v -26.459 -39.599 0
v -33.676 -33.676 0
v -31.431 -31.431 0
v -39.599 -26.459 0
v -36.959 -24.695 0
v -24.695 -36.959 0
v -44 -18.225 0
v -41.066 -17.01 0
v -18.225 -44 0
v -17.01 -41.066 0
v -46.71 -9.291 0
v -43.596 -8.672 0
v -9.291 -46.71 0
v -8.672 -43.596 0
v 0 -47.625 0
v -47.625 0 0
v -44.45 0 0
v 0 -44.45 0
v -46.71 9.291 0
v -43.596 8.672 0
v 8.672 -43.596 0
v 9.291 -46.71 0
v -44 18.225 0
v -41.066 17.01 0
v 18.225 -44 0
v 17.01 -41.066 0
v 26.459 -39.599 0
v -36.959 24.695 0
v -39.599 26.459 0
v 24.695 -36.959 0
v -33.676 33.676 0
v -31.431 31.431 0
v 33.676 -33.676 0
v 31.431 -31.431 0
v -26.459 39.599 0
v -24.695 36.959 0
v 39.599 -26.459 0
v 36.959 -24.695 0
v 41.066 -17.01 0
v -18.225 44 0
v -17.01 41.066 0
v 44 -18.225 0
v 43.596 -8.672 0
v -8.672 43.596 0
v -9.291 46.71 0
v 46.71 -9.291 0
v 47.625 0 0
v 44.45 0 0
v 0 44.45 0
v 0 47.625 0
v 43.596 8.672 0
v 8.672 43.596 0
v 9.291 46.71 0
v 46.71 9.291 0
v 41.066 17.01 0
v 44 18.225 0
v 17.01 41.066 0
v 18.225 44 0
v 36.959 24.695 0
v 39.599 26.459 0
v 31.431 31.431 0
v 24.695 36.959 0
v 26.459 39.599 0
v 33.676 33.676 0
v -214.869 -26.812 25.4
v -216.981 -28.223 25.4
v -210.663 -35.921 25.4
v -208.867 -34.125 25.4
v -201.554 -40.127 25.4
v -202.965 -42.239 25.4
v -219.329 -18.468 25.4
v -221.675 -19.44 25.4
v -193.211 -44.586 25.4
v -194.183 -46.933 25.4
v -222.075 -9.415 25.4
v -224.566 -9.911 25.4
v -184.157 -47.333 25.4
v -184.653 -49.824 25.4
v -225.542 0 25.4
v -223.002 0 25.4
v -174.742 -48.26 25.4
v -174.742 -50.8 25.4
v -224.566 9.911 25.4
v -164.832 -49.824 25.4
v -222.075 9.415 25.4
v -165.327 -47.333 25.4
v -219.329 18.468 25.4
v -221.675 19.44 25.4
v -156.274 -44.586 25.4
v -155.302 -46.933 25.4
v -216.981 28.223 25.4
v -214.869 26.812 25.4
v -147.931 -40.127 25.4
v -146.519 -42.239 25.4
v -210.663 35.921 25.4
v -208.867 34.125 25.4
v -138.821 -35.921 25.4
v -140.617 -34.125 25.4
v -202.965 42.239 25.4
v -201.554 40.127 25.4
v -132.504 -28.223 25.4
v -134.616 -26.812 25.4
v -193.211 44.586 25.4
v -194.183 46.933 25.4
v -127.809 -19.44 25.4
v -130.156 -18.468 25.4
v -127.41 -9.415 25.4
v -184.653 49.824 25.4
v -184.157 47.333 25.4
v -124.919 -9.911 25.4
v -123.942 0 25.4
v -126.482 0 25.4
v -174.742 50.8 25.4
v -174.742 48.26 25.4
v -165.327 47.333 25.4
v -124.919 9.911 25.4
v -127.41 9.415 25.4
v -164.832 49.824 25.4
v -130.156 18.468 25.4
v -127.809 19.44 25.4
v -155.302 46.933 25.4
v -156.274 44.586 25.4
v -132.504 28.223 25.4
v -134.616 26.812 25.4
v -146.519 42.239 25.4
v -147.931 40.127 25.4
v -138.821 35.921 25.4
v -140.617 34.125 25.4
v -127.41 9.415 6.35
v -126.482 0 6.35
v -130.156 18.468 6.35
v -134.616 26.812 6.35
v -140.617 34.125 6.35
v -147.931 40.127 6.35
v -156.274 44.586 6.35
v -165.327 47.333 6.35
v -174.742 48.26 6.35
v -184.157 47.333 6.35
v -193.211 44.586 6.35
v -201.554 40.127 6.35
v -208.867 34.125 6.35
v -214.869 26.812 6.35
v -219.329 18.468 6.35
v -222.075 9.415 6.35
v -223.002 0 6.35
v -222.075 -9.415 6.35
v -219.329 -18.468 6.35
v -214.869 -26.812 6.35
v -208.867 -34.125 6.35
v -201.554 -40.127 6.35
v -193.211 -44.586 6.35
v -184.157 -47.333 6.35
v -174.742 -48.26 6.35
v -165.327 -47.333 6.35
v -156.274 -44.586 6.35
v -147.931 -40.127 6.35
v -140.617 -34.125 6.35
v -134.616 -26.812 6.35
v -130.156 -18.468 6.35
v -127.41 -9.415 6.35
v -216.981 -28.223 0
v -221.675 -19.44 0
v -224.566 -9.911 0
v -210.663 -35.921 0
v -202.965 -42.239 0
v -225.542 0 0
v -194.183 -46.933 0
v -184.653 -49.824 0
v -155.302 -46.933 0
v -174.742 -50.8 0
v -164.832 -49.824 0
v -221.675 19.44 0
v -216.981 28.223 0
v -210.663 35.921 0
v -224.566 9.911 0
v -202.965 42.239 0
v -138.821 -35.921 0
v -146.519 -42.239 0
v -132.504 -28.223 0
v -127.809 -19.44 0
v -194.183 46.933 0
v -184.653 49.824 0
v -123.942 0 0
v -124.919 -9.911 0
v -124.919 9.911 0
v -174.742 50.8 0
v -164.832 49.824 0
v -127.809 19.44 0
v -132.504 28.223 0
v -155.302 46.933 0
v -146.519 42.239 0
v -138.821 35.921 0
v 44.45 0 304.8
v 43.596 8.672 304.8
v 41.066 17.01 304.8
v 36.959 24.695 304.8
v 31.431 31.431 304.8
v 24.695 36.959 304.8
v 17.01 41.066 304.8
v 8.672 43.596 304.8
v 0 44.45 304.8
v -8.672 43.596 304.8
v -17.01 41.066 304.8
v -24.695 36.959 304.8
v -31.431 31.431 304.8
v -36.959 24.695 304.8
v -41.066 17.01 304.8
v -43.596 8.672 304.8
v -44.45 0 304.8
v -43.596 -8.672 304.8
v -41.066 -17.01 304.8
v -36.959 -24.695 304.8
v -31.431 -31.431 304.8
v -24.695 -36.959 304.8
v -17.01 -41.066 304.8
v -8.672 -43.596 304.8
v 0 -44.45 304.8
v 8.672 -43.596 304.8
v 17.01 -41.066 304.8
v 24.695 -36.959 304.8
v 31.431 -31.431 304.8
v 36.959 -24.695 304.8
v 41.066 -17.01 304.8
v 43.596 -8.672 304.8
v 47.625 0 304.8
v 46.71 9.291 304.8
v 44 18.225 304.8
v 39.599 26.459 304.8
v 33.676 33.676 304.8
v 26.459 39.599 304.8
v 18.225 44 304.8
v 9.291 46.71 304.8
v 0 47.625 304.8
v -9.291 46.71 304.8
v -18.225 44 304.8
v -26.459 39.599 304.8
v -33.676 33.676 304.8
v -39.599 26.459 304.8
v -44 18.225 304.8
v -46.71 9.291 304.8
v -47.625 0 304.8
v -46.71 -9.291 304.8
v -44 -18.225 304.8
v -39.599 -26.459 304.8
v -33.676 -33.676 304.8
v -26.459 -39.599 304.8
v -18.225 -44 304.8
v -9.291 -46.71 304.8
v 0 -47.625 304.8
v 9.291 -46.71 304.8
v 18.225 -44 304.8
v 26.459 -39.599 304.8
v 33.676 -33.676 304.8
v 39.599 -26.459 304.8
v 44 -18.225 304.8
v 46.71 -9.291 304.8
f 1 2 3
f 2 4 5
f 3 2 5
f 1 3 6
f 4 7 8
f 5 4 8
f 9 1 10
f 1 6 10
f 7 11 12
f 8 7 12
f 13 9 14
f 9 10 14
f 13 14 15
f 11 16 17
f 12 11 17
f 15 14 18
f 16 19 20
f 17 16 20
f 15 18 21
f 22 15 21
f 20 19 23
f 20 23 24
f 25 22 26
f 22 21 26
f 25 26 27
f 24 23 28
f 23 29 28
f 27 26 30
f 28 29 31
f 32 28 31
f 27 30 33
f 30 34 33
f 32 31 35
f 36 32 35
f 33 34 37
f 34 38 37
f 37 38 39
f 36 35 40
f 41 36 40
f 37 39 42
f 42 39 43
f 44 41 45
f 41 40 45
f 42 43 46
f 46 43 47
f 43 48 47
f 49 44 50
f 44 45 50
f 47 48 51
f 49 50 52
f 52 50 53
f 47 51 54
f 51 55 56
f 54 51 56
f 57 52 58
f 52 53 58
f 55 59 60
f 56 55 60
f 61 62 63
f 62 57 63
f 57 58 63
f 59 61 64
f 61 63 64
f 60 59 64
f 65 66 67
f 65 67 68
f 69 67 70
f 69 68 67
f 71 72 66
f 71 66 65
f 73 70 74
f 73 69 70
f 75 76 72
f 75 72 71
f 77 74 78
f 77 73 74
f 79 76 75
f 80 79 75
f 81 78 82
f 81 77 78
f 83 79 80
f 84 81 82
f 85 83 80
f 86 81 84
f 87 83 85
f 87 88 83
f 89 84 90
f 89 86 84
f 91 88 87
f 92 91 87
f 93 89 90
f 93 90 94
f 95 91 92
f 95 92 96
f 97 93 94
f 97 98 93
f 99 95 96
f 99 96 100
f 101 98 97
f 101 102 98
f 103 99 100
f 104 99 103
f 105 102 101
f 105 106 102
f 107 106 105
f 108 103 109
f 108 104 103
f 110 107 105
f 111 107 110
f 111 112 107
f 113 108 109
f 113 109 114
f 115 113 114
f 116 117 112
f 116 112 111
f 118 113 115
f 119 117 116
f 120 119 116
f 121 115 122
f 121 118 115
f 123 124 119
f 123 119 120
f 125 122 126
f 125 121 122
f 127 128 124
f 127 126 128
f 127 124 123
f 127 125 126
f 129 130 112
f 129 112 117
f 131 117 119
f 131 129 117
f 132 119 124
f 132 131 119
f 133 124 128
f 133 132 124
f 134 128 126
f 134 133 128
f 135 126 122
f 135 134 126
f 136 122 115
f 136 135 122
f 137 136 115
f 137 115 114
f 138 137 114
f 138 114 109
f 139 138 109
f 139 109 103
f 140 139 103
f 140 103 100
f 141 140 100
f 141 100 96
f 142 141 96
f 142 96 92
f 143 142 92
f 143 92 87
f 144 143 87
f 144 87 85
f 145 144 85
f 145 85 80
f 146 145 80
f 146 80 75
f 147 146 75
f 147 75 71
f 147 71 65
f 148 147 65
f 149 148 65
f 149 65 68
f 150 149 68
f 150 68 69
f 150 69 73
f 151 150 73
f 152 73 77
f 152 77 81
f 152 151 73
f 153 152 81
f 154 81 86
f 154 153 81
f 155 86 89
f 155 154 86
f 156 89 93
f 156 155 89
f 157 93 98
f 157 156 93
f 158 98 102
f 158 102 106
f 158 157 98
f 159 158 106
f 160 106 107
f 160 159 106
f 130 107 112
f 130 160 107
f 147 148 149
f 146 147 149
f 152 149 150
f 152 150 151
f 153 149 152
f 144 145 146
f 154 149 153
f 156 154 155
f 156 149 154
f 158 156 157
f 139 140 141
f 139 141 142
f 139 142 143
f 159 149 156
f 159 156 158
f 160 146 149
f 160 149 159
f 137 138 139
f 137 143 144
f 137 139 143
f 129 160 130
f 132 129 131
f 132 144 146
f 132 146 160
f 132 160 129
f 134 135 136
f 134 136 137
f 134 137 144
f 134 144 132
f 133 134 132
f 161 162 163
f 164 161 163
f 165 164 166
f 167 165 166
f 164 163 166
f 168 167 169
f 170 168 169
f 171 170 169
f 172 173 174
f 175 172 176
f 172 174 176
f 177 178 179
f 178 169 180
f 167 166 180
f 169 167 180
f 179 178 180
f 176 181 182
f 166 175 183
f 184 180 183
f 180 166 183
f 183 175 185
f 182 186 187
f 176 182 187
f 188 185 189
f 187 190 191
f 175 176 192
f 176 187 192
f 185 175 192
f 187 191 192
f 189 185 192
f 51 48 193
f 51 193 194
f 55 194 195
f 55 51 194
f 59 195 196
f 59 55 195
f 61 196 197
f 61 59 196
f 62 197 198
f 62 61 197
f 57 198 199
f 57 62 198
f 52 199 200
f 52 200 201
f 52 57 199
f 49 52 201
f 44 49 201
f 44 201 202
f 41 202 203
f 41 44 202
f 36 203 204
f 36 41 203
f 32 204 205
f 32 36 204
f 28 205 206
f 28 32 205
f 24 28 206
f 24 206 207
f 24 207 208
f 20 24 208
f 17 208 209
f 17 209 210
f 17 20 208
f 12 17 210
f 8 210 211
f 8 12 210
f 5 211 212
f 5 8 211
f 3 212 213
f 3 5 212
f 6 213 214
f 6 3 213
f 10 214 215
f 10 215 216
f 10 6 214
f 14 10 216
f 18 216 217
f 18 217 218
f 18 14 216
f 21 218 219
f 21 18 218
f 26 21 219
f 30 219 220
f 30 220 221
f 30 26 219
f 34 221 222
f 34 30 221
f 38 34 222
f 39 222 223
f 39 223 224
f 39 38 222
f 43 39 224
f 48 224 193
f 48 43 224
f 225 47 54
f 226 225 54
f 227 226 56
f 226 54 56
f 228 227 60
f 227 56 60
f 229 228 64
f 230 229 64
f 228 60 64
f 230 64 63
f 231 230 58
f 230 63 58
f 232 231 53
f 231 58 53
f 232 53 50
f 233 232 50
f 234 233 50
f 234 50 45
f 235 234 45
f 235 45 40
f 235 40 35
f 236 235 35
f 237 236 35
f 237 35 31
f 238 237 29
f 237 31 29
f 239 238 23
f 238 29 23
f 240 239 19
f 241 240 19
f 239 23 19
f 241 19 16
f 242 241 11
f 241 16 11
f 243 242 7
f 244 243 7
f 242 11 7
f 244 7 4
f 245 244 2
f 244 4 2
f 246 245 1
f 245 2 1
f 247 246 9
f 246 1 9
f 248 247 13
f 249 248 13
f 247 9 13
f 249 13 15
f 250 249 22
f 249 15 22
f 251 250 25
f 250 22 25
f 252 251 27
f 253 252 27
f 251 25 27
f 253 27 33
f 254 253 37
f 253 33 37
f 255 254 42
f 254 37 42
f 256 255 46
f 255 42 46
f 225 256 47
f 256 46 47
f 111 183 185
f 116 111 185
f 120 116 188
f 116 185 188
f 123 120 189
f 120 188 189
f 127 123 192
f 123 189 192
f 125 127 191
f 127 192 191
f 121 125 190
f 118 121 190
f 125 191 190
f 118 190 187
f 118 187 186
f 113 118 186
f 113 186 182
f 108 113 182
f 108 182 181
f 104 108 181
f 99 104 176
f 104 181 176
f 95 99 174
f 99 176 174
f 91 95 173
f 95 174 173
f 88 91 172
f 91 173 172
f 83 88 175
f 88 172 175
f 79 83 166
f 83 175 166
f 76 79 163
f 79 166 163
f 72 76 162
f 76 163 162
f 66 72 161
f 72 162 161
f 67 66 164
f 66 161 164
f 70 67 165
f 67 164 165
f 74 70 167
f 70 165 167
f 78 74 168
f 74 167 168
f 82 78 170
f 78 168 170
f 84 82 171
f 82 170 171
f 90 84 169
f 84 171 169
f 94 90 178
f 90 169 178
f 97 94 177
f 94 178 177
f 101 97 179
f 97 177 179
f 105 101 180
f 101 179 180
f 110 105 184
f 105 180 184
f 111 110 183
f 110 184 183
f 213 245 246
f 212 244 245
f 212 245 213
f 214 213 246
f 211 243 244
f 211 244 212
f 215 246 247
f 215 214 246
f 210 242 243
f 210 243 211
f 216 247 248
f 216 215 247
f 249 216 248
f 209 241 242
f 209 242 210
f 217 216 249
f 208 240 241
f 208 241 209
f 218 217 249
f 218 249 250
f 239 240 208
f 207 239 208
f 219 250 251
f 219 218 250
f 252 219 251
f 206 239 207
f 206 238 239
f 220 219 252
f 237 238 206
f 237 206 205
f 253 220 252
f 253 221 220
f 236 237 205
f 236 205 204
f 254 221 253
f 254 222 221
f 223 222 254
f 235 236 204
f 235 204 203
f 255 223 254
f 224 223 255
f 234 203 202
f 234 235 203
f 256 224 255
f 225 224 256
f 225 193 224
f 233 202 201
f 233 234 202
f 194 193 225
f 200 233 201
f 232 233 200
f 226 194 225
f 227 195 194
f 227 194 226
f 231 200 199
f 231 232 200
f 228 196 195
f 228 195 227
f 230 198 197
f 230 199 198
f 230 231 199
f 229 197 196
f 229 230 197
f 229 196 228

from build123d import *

# Parameters (mm, degrees)
F0_R     = 47.625
F0_R_2   = 44.45
F1_DEPTH = 304.8
F0_R_3   = 48.26
F2_DEPTH = 6.35
F0_R_4   = 50.8
F3_DEPTH = 25.4


with BuildPart() as f1:
    # F0 (on Top) → F1 (new body)
    with BuildSketch(Plane.XY):
        Circle(F0_R)
        Circle(F0_R_2, mode=Mode.SUBTRACT)
    extrude(amount=F1_DEPTH)


with BuildPart() as f2:
    # F0 (on Top) → F2 (new body)
    with BuildSketch(Plane.XY):
        with Locations((-174.742401, 0)):
            Circle(F0_R_3)
    extrude(amount=F2_DEPTH)

    # F0 (on Top) → F3 (join)
    with BuildSketch(Plane.XY):
        with Locations((-174.742401, 0)):
            Circle(F0_R_4)
        with Locations((-174.742401, 0)):
            Circle(F0_R_3, mode=Mode.SUBTRACT)
    extrude(amount=F3_DEPTH)


solid = Compound([f1.part, f2.part])
